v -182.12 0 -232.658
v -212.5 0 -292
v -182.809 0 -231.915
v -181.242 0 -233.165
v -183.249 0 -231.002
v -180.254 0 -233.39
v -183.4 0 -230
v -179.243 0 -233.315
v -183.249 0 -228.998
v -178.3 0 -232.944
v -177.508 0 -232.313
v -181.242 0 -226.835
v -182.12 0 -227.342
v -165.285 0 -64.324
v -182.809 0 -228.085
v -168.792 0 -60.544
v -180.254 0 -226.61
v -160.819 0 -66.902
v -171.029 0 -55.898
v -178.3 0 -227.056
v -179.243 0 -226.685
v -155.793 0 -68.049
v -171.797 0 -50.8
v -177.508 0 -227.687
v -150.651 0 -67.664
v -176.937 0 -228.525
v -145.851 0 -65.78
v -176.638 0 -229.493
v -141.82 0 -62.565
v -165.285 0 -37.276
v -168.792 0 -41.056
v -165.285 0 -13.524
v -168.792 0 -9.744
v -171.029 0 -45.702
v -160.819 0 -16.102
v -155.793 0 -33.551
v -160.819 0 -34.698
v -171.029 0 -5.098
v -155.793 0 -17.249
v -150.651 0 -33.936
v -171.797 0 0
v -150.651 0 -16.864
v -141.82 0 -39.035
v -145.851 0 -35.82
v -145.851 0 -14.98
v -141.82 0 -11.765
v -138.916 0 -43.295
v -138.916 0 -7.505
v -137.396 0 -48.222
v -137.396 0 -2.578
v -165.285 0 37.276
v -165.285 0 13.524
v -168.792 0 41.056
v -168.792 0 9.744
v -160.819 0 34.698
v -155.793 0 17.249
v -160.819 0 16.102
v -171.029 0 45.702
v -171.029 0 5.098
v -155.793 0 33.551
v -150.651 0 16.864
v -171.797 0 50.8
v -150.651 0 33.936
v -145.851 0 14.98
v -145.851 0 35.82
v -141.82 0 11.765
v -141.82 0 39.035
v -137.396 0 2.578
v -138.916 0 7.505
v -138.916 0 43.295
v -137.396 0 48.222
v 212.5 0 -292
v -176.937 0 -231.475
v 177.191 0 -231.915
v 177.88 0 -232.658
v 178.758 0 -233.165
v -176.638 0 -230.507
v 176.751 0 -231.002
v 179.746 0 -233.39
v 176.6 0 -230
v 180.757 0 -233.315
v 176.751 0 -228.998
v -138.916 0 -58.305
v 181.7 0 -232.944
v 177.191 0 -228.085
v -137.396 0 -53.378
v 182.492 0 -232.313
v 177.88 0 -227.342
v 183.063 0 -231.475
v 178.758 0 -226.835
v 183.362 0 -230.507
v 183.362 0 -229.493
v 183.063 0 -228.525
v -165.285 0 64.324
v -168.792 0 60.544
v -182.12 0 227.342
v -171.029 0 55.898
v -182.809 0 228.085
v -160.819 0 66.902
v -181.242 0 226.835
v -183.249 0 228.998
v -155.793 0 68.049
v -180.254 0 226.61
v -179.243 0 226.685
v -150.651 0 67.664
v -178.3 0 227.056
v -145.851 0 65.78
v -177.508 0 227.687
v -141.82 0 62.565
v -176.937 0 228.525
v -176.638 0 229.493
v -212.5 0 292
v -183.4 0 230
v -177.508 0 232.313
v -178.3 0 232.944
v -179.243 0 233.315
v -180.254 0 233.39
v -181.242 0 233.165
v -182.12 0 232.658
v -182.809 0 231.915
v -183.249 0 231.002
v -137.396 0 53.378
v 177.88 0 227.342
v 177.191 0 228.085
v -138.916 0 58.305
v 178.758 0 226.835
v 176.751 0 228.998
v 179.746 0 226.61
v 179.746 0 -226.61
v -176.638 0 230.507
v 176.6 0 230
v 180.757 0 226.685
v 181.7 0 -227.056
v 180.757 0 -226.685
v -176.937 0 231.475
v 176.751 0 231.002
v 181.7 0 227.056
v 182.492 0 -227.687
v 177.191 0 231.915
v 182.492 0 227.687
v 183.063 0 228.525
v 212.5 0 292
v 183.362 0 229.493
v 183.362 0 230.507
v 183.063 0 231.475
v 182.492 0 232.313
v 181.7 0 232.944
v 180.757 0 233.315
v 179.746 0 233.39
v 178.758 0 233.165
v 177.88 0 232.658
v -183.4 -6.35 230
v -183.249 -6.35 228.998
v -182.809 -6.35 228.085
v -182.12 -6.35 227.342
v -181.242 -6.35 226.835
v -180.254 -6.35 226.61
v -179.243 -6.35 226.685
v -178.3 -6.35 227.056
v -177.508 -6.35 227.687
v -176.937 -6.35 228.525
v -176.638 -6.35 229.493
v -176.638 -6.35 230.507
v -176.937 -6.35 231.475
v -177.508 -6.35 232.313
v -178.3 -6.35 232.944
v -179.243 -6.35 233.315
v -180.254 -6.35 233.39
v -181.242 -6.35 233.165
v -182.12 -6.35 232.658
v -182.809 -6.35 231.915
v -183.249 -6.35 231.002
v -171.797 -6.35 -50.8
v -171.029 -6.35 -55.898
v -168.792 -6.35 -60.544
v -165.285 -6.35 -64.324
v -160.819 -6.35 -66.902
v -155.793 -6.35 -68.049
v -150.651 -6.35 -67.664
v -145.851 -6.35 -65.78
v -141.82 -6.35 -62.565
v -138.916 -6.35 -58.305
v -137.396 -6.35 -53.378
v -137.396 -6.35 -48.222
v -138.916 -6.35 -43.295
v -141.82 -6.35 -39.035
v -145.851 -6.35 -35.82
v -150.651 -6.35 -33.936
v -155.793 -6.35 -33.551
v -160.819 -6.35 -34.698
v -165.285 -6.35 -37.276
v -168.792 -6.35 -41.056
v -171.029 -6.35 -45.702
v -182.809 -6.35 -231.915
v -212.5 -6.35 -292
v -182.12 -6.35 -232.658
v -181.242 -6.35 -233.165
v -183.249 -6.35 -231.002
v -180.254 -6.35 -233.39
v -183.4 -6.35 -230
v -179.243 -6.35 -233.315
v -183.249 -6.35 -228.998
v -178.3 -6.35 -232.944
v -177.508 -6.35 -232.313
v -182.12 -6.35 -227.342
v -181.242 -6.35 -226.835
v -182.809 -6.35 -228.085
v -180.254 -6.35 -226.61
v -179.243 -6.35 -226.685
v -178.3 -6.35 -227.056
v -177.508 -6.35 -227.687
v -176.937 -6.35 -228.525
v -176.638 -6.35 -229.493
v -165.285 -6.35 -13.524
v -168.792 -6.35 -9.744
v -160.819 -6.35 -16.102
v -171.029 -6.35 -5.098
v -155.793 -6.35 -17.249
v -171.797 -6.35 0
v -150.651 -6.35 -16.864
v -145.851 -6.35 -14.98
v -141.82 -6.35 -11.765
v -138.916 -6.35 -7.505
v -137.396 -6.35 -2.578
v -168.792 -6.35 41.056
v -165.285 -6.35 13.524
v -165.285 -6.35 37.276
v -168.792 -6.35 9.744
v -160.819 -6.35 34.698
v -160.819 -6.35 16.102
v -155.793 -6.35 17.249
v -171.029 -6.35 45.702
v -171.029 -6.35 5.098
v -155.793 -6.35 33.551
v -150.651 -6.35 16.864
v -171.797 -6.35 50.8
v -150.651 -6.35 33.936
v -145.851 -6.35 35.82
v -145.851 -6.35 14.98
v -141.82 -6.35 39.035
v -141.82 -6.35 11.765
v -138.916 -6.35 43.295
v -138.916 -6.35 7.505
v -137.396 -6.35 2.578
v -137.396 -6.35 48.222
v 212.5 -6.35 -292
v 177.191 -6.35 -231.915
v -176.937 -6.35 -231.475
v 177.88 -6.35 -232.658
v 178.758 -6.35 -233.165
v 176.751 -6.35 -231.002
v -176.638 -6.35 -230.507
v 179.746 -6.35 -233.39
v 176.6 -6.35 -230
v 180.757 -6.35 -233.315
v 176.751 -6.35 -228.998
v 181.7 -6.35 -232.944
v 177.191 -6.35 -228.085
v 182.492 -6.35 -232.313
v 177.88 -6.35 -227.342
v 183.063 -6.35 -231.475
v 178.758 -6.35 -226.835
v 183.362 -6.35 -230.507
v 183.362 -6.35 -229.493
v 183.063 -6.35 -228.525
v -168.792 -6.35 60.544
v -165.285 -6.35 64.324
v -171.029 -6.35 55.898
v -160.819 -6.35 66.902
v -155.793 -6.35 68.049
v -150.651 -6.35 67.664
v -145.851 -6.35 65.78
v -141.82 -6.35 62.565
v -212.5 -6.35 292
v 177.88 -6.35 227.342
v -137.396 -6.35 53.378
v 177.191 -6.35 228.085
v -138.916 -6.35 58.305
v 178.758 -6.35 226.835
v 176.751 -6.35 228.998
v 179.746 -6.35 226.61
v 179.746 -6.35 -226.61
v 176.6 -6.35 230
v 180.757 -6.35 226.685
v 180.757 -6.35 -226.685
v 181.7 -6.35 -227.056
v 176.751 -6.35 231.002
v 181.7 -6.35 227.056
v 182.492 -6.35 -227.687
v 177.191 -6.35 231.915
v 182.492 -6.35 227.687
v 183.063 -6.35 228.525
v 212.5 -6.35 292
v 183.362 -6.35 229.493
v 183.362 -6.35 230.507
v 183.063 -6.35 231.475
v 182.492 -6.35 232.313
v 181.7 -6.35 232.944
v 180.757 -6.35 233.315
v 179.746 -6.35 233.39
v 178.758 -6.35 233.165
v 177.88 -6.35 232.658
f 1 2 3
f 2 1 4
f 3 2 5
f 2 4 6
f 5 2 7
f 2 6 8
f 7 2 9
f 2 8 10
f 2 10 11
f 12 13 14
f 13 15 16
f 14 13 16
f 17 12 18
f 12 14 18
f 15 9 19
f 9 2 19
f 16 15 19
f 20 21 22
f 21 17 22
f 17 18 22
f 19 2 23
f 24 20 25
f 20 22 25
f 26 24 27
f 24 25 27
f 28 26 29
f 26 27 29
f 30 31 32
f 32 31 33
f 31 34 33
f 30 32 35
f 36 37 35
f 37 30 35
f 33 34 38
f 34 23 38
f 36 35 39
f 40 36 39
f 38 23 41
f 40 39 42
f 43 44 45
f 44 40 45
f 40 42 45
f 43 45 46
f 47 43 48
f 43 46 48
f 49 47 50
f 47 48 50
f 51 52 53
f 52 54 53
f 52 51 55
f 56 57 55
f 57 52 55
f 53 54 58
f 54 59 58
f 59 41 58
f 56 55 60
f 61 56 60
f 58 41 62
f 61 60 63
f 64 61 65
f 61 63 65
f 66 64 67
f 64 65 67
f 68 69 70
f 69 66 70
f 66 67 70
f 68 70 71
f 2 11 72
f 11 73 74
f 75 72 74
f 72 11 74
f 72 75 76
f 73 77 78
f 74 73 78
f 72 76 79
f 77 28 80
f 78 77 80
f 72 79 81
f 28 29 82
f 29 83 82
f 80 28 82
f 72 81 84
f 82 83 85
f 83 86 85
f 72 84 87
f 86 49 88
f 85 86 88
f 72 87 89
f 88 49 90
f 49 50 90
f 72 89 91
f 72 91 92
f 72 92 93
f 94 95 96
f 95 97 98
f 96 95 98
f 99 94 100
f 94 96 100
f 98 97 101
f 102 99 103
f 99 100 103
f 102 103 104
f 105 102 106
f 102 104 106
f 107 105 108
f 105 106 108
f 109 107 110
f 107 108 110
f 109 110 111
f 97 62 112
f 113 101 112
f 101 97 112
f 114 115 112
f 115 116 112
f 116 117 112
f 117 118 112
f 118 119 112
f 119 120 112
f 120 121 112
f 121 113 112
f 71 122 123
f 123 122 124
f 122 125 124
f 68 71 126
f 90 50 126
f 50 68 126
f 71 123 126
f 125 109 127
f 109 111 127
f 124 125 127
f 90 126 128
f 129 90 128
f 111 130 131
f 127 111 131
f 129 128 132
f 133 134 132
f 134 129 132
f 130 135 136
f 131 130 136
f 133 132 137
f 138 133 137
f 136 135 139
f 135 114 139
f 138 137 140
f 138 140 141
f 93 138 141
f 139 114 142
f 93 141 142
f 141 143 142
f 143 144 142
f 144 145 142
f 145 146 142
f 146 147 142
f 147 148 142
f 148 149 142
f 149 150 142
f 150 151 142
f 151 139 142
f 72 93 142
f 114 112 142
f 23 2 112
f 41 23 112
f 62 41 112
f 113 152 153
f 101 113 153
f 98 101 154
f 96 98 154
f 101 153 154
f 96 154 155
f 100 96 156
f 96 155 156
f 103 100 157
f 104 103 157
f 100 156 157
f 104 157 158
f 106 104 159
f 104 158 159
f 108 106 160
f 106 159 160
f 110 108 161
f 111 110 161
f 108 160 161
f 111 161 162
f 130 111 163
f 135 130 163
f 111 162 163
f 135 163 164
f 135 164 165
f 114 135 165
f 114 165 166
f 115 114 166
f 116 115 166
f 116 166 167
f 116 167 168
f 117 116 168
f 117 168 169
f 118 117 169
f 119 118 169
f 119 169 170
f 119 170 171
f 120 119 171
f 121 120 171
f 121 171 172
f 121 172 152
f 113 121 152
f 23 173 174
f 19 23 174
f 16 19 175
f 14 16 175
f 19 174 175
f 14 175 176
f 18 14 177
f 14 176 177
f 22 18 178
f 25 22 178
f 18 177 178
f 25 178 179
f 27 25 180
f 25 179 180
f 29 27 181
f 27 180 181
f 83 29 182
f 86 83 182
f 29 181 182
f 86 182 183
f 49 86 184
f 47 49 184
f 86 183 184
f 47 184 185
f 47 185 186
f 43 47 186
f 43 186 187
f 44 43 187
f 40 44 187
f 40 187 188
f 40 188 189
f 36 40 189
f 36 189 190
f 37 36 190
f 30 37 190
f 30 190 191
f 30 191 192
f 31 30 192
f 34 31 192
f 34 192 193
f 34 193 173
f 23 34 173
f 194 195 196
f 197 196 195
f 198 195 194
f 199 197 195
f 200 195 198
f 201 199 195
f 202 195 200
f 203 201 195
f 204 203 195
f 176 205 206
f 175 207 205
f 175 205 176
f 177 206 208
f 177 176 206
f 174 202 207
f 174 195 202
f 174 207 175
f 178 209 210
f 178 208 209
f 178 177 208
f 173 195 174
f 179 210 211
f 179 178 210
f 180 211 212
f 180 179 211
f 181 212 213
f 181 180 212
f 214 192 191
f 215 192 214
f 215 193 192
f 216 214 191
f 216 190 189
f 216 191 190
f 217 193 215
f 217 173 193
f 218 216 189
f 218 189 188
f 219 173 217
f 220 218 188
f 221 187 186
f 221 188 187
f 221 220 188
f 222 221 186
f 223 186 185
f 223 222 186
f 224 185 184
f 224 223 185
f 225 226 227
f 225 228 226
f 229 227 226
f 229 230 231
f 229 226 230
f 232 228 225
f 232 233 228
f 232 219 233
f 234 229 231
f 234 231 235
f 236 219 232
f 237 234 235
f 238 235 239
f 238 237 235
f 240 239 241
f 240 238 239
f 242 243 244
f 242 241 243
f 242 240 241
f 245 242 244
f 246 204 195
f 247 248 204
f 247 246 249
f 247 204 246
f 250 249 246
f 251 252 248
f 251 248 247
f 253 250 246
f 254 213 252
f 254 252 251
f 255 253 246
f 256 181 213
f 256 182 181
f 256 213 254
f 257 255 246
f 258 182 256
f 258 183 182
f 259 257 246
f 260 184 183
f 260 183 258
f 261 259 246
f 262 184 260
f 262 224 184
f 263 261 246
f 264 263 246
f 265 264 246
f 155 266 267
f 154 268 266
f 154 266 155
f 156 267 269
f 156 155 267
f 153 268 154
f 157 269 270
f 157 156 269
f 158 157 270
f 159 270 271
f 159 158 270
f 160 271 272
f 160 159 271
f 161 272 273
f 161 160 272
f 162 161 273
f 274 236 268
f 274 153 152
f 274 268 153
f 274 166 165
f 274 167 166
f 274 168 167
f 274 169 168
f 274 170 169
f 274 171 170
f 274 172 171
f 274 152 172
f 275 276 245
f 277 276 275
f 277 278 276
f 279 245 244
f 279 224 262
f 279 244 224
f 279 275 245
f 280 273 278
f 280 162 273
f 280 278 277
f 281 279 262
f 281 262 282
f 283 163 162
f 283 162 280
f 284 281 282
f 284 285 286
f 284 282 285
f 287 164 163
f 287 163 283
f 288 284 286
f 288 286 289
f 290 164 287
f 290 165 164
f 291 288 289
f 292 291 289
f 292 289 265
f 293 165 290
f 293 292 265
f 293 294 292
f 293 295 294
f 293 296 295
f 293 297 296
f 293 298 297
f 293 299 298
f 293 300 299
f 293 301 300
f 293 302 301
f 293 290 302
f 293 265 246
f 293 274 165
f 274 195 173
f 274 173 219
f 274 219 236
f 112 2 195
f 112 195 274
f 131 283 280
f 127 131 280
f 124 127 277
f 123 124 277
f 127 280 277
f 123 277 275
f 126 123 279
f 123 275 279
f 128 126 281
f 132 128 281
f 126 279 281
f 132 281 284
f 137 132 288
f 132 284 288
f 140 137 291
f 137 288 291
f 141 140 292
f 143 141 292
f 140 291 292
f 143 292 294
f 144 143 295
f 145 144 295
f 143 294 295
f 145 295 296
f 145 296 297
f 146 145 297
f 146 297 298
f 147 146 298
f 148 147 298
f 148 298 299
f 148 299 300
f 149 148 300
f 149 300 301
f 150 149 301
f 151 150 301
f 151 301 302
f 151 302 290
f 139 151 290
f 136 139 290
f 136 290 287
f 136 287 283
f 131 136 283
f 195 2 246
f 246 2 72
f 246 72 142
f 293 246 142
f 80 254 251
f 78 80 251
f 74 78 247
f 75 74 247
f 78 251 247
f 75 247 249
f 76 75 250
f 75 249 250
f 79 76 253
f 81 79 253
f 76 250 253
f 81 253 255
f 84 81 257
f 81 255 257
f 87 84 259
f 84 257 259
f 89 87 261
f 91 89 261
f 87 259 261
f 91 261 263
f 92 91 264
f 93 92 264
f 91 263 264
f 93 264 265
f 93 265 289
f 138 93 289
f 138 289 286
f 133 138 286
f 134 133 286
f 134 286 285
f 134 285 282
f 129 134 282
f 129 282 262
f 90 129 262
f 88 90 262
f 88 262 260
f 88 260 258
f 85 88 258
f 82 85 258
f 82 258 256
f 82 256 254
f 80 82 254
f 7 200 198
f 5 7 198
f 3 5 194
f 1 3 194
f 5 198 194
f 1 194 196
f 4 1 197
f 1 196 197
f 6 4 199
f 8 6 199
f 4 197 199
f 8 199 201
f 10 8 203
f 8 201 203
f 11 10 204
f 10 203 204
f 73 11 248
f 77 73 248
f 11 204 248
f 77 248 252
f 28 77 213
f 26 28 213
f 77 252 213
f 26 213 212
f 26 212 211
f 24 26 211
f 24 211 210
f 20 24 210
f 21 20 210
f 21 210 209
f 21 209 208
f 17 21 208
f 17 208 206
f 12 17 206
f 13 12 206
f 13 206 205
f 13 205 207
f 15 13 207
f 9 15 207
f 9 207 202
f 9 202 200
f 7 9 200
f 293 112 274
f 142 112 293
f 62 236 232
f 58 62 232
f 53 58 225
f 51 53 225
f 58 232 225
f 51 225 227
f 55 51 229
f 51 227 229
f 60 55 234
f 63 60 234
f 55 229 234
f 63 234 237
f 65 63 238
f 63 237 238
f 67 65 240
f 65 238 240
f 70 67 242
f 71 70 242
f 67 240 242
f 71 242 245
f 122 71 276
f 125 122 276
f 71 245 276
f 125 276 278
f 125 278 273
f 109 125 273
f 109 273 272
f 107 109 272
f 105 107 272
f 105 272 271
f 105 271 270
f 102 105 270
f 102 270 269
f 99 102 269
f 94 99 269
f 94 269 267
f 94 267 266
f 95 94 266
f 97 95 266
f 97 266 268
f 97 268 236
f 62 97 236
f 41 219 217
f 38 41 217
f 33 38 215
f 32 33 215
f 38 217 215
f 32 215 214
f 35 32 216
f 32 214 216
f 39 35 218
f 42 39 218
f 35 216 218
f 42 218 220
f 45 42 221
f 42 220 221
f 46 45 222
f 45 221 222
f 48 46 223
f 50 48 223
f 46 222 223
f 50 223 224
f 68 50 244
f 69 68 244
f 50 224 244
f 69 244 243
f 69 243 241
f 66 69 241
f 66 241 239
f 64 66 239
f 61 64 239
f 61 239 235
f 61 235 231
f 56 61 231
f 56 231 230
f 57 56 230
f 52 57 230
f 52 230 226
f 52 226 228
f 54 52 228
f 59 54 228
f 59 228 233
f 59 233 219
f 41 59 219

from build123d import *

# Parameters (mm, degrees)
F0_W     = 425
F0_H     = 584
F1_DEPTH = 6.35
F2_D     = 6.8
F3_D     = 34.5948


with BuildPart() as f1:
    # F0 (on Front) → F1 (new body)
    with BuildSketch(Plane.XZ):
        Rectangle(F0_W, F0_H)
    extrude(amount=F1_DEPTH)

    # F2 (through all)
    with Locations(Plane(origin=(0, 0, 0), x_dir=(1, 0, 0), z_dir=(0, 1, 0))):
        with Locations((-180, -230), (-180, 230), (180, 230), (180, -230)):
            Hole(F2_D / 2)

    # F3 (through all)
    with Locations(Plane(origin=(0, 0, 0), x_dir=(1, 0, 0), z_dir=(0, 1, 0))):
        with Locations((-154.5, -50.8), (-154.5, 0), (-154.5, 50.8)):
            Hole(F3_D / 2)


solid = f1.part
